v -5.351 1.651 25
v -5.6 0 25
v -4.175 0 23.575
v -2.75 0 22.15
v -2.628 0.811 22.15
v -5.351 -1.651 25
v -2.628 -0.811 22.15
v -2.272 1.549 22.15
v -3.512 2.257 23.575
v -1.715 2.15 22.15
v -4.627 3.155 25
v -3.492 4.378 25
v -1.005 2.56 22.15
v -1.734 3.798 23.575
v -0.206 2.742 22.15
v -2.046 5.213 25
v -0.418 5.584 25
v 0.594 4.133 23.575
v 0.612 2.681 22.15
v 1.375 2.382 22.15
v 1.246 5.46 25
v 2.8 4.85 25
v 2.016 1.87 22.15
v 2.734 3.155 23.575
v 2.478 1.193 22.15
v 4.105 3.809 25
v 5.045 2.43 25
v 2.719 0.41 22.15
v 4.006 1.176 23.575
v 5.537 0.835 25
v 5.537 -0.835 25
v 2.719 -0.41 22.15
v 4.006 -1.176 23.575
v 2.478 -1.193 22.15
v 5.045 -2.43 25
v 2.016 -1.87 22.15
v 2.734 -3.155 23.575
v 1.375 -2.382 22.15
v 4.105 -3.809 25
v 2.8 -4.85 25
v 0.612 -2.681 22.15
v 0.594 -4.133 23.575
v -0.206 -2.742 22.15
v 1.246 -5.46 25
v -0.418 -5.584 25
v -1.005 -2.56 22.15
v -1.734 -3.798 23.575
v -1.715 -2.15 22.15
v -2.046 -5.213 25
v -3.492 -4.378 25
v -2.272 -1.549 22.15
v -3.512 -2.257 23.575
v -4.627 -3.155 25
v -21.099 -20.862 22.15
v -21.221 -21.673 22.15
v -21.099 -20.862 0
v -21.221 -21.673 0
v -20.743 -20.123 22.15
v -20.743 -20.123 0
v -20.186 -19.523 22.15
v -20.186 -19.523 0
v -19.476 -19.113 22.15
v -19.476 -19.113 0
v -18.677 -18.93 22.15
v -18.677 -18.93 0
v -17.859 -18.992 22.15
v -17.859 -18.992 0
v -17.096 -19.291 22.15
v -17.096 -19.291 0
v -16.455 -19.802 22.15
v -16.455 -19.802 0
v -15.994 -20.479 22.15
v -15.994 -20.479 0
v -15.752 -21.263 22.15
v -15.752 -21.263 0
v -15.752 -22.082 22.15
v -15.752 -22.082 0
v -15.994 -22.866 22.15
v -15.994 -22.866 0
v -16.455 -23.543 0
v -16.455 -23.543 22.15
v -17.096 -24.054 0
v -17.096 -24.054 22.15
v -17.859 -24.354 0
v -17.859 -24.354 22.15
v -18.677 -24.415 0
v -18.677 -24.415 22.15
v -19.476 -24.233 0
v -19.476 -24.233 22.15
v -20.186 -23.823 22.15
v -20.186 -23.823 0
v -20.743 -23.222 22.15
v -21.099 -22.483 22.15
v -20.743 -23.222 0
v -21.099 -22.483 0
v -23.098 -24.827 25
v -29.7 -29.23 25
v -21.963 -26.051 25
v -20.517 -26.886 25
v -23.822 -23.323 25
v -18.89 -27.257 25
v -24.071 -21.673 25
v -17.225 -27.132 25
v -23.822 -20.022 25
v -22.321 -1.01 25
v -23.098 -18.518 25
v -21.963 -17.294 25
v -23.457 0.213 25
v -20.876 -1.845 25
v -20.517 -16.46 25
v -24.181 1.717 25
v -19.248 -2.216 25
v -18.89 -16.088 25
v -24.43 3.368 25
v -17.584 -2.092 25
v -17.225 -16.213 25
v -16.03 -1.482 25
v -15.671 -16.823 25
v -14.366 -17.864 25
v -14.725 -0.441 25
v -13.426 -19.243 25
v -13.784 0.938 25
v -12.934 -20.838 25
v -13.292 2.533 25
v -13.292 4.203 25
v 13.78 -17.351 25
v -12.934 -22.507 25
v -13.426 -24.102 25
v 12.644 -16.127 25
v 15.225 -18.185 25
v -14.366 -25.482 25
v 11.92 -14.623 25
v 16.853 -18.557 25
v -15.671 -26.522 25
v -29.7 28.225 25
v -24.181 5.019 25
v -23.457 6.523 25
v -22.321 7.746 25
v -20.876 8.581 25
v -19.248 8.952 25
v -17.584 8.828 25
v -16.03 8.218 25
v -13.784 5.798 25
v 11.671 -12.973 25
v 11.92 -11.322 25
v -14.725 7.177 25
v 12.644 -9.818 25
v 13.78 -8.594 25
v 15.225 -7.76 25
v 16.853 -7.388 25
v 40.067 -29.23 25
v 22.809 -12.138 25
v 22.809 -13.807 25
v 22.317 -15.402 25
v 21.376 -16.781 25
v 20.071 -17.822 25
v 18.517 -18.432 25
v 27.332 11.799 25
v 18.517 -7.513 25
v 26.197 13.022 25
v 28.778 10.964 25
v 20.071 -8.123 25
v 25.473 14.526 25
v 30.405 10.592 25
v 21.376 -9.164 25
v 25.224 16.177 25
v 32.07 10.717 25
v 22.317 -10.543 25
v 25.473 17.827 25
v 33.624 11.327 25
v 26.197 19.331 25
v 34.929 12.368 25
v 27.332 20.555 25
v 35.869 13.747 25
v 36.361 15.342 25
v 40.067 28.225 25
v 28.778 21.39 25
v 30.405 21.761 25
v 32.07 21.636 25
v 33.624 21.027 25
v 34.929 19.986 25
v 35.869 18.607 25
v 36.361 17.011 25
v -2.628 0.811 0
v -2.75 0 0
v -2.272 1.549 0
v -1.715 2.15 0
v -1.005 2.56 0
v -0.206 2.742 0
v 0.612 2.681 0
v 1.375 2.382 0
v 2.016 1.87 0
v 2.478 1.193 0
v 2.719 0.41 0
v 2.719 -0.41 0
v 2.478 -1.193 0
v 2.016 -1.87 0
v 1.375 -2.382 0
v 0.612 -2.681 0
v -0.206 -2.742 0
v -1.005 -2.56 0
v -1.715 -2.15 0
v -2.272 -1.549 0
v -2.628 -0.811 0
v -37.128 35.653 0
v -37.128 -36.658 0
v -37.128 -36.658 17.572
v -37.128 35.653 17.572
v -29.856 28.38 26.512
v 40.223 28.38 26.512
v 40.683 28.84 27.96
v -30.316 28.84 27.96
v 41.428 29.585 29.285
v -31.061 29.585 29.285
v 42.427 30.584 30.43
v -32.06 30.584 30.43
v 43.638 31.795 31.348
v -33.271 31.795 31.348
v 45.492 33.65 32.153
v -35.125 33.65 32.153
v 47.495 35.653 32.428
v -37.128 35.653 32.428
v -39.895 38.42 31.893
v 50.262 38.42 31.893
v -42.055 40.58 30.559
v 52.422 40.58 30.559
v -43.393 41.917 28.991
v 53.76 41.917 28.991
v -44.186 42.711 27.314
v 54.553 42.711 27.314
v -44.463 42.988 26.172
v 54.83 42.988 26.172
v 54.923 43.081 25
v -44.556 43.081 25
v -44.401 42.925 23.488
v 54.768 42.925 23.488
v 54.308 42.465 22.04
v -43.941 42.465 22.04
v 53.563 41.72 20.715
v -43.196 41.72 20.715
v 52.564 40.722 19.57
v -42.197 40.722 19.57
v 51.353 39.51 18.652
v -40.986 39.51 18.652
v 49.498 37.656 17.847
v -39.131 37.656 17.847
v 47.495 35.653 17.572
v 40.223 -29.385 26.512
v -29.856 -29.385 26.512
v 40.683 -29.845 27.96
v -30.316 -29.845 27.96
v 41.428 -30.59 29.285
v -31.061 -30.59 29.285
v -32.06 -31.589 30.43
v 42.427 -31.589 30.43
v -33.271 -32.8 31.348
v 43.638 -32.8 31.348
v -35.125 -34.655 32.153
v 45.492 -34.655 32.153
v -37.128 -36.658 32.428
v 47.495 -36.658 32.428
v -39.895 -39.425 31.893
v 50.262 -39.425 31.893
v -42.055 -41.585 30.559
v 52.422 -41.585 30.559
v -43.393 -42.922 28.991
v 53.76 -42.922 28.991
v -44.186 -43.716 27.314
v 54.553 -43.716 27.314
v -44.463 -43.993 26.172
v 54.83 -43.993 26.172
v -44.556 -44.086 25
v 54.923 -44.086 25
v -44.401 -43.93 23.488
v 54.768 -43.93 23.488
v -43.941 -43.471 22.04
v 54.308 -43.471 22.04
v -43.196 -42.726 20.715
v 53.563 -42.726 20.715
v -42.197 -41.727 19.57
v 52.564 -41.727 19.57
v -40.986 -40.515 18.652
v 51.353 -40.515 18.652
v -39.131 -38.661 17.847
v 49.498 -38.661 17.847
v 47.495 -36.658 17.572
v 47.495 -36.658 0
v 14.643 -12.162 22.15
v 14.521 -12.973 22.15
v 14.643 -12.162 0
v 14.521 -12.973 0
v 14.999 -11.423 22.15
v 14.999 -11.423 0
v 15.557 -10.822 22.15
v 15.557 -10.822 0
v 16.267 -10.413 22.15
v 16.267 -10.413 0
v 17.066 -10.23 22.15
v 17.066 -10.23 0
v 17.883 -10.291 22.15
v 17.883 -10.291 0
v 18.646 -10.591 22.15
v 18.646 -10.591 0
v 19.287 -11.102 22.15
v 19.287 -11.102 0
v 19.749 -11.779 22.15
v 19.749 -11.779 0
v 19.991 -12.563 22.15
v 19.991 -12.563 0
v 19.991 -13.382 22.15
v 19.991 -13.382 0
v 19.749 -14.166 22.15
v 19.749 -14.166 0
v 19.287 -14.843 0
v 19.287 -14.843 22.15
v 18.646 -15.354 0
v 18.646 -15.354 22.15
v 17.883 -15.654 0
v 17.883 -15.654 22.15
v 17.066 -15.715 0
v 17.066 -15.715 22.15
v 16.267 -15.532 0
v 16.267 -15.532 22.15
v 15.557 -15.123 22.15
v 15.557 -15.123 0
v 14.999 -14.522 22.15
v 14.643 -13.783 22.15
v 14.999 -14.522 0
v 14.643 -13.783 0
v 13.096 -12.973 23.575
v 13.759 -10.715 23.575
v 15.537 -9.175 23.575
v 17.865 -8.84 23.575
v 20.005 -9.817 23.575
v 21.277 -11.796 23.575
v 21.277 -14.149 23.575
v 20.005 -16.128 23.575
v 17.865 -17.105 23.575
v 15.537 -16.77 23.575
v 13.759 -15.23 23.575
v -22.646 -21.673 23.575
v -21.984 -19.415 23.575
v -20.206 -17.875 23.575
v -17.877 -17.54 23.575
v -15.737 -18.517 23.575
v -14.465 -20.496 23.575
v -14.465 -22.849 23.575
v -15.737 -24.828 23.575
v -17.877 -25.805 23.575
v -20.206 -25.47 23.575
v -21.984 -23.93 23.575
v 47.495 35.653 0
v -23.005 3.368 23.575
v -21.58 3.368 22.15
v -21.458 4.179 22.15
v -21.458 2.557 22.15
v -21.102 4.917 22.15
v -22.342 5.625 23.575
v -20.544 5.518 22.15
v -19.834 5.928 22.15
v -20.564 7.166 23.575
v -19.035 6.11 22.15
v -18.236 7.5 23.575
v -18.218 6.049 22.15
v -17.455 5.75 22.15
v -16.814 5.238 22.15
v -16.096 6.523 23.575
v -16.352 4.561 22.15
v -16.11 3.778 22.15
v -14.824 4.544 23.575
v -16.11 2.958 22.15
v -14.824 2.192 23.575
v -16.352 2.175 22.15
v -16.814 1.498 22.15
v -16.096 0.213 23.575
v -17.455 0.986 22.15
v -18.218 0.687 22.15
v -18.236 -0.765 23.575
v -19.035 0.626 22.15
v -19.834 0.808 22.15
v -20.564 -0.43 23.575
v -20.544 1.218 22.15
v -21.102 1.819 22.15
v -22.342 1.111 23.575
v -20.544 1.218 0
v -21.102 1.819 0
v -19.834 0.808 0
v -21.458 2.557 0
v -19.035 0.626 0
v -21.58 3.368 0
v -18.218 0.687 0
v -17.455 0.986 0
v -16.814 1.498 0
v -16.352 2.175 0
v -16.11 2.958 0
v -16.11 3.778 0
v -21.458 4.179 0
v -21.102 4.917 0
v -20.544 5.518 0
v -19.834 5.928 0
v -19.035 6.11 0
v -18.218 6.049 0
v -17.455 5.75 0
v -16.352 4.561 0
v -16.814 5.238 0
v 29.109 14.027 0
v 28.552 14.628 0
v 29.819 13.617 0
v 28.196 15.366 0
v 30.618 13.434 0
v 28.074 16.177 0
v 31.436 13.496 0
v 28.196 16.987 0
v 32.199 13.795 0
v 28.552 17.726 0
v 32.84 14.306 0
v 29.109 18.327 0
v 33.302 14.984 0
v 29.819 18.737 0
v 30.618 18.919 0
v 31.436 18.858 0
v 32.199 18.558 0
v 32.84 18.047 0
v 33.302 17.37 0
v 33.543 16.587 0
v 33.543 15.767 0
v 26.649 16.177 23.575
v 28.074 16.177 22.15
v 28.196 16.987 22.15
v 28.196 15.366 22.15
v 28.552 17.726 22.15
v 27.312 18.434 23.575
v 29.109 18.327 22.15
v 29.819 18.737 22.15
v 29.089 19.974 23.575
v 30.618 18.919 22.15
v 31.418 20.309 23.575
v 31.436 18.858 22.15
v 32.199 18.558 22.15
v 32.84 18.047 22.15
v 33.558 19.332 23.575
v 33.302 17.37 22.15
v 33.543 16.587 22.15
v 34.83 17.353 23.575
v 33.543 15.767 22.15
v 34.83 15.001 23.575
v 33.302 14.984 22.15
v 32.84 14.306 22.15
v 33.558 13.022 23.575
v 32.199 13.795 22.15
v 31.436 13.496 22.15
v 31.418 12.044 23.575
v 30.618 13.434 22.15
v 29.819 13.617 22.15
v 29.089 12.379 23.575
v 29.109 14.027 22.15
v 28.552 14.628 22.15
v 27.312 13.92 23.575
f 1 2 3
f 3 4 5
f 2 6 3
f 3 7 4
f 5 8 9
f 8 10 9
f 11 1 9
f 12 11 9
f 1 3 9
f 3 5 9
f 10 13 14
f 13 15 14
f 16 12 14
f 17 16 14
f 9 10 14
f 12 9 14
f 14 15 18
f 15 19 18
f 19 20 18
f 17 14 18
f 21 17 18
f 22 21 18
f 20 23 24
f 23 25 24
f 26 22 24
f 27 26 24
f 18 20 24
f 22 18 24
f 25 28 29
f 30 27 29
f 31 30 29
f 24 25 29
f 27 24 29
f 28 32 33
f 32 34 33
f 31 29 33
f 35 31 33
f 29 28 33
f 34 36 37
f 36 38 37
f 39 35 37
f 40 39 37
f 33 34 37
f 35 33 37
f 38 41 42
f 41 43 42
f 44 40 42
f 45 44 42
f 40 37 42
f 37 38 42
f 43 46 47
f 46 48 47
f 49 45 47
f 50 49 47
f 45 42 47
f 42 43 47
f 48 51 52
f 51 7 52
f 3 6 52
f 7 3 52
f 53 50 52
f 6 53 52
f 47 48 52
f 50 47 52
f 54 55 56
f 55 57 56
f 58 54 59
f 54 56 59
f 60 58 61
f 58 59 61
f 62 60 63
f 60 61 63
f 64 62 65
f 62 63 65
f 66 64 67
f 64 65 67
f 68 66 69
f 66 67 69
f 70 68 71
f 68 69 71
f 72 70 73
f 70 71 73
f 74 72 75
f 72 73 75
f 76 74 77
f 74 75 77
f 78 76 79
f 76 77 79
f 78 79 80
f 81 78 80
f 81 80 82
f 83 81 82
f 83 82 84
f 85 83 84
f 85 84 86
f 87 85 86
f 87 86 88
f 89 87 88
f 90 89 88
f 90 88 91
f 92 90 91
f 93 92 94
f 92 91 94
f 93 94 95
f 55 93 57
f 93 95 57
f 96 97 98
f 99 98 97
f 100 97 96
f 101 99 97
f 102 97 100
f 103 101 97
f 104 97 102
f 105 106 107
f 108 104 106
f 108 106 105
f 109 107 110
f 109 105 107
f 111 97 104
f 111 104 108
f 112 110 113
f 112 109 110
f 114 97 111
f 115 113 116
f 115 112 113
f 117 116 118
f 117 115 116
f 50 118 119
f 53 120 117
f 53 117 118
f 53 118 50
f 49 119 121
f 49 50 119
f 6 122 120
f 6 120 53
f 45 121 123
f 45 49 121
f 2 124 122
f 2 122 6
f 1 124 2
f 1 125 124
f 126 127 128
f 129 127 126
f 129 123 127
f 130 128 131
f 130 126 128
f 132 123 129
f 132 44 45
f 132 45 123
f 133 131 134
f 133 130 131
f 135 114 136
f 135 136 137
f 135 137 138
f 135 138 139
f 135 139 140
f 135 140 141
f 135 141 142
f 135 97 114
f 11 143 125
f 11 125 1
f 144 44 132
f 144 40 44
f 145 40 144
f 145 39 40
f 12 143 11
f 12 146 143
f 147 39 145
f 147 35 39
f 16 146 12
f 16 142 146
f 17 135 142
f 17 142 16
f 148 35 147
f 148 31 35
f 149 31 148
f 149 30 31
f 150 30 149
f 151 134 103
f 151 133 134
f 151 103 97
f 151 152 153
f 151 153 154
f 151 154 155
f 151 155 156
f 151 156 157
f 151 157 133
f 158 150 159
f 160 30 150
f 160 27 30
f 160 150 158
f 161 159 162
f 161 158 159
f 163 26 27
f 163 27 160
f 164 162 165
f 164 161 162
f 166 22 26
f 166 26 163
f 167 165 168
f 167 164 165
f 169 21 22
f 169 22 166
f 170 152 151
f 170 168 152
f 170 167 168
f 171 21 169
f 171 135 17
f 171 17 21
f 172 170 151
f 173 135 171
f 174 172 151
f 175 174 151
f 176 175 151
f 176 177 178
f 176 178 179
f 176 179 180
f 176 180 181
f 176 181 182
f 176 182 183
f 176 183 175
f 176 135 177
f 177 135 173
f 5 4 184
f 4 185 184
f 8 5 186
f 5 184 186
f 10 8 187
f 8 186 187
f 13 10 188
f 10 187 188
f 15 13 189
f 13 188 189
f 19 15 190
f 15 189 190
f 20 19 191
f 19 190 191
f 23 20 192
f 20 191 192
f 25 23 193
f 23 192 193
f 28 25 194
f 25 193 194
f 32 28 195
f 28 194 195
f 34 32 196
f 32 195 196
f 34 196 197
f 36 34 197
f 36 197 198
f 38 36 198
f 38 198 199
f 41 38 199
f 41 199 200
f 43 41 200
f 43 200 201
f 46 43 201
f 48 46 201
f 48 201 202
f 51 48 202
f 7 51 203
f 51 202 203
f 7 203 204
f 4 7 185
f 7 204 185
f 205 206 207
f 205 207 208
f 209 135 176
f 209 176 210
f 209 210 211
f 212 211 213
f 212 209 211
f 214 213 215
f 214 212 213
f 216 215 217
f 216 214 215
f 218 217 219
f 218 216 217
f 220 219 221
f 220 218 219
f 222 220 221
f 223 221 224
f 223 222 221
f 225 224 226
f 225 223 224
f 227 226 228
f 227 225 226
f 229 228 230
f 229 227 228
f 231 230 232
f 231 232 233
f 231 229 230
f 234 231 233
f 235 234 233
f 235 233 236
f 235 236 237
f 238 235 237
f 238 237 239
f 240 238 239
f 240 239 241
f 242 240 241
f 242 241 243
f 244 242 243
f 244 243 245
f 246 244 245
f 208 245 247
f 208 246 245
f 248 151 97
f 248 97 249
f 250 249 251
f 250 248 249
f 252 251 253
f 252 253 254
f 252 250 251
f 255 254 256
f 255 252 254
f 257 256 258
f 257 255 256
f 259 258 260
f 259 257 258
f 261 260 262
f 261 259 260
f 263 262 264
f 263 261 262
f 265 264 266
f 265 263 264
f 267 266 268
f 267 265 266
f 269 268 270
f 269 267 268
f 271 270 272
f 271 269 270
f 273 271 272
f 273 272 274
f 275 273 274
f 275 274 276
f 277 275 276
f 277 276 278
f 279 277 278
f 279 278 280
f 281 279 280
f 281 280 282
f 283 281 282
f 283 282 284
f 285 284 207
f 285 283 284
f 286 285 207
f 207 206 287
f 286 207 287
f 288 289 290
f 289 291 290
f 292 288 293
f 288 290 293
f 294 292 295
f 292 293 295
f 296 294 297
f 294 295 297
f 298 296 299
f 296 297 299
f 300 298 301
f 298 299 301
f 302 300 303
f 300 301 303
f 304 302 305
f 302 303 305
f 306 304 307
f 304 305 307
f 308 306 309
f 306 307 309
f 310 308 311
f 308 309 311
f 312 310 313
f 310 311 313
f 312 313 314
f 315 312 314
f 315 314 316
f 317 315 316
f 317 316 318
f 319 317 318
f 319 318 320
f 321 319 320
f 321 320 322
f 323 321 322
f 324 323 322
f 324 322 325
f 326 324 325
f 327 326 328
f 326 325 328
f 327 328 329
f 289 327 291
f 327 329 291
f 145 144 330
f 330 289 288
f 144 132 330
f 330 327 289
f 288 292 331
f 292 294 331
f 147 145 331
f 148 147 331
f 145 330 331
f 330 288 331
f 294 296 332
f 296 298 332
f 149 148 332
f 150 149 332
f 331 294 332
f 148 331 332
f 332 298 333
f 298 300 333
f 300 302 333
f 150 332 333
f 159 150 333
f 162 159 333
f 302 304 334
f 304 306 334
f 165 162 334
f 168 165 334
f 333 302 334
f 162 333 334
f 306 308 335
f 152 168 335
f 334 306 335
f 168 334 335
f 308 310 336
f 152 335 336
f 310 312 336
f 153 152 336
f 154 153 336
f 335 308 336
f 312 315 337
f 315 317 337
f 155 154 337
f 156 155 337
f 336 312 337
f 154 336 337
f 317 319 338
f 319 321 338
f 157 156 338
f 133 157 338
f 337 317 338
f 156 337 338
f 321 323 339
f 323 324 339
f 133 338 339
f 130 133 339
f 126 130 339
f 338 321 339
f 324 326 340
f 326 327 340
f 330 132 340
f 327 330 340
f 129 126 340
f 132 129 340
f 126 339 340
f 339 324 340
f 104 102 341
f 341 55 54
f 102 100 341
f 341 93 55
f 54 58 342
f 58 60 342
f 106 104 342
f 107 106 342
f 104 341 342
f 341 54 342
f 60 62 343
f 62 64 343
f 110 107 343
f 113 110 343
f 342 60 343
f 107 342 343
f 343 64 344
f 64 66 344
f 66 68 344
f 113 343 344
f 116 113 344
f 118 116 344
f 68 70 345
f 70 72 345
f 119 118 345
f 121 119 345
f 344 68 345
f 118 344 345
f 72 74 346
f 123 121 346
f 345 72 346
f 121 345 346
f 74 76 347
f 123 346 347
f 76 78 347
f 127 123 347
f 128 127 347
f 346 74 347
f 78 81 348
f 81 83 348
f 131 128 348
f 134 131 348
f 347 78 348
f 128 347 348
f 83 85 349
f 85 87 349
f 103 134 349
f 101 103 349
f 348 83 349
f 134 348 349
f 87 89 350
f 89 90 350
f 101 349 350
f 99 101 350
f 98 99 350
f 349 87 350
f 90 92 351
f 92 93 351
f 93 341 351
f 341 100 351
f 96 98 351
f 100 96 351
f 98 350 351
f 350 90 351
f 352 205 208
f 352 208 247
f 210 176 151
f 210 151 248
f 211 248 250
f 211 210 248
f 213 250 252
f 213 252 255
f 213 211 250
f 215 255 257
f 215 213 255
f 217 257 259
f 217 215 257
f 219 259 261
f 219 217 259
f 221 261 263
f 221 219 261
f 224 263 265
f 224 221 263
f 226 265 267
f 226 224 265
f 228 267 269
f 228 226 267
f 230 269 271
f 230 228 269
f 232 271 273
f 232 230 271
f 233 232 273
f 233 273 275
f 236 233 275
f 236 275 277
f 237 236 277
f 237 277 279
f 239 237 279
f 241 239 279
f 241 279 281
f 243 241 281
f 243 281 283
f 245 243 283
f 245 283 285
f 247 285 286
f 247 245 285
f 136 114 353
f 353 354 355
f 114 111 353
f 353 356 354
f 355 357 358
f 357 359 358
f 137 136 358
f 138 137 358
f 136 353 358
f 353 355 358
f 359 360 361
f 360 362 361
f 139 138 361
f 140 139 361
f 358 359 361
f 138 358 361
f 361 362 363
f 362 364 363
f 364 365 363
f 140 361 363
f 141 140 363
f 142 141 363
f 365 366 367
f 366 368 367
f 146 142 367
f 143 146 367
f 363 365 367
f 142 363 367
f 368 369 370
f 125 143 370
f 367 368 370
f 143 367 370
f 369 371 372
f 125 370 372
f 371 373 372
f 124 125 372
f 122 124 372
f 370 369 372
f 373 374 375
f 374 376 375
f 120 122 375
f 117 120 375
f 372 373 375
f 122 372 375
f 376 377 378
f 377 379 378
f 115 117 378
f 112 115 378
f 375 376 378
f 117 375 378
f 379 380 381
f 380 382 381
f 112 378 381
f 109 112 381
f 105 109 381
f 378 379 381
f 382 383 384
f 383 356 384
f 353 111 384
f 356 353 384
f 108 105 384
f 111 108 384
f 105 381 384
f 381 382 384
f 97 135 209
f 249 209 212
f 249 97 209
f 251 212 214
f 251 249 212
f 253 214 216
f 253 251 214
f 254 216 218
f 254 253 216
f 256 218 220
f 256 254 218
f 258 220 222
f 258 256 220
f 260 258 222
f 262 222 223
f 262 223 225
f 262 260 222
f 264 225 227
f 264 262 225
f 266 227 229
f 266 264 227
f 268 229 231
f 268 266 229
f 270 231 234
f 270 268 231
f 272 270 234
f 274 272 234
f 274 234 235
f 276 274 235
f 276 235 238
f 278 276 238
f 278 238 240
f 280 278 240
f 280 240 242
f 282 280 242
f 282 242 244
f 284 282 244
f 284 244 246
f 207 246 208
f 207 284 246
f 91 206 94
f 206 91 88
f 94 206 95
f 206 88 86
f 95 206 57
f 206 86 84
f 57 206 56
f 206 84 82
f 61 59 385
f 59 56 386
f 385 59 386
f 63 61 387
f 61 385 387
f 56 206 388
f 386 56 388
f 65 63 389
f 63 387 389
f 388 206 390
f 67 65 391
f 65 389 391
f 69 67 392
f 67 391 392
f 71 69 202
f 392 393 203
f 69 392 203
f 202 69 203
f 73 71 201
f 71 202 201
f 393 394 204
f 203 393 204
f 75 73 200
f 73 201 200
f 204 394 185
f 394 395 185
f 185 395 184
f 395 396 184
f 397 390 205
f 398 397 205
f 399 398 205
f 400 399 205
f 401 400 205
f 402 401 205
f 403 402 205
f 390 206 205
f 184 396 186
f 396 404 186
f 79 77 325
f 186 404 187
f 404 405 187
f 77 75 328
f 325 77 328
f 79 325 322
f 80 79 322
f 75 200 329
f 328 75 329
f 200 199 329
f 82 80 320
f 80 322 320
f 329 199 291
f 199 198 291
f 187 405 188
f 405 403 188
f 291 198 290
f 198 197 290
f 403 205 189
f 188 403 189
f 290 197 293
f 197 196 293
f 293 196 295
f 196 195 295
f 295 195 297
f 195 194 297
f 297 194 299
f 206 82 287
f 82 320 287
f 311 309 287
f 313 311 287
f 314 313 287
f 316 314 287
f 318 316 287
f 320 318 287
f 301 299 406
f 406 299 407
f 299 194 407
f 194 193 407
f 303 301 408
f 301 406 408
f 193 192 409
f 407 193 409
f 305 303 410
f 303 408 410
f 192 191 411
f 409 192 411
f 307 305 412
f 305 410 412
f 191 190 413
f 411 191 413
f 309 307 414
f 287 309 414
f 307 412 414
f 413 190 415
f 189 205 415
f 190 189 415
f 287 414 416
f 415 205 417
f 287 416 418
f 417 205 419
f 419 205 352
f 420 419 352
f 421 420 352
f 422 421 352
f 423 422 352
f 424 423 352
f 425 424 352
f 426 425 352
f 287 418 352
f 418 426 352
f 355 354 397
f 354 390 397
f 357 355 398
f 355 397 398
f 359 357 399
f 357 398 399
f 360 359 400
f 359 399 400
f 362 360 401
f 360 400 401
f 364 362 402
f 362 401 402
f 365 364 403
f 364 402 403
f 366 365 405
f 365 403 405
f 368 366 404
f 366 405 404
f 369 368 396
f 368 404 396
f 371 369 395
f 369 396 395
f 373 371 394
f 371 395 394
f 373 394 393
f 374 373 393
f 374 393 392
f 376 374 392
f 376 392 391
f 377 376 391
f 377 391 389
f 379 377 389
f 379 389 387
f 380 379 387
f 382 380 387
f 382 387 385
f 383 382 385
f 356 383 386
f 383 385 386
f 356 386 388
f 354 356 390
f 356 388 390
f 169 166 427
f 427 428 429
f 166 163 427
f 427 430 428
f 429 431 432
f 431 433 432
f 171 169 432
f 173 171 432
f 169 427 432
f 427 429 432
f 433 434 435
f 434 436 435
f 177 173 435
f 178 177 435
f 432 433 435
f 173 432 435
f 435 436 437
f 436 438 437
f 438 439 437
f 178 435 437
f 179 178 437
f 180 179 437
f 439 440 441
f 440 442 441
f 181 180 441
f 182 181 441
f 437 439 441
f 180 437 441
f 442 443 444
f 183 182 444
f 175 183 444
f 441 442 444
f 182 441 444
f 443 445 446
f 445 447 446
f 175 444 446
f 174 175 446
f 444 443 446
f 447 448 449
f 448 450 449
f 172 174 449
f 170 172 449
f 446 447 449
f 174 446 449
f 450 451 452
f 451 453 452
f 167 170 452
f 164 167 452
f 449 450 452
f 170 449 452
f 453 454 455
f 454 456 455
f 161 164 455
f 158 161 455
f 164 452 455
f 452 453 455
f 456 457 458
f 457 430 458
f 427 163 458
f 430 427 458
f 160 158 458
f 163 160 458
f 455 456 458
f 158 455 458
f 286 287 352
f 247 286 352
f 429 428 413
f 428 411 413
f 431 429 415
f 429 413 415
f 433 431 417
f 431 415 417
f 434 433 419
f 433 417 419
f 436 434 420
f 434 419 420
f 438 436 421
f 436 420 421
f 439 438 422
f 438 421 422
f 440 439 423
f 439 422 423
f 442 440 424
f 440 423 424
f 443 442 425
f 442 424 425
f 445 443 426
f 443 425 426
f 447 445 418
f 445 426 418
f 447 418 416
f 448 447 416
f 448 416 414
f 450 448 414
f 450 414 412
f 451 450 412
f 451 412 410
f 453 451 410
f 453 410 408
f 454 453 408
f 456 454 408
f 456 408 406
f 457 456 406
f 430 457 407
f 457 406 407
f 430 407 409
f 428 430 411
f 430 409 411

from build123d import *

# Parameters (mm, degrees)
F0_W           = 84.6236236393
F0_H           = 72.3108425736
F1_DEPTH       = 25
F3_D           = 5.5
F3_CSINK_D     = 11.2
F3_CSINK_ANGLE = 90


with BuildPart() as f1:
    # F0 (on Top) → F1 (new body)
    with BuildSketch(Plane.XY):
        with Locations((5.1834825426, -0.5025528371)):
            Rectangle(F0_W, F0_H)
    extrude(amount=F1_DEPTH)

    # F3 (through all)
    with Locations(Plane.XY.offset(25)):
        with Locations((-18.4712763876, -21.672623232), (17.2712653875, -12.972522527), (0, 0), (-18.829761073, 3.3679855987), (30.8238454163, 16.1767713726)):
            CounterSinkHole(F3_D / 2, F3_CSINK_D / 2, counter_sink_angle=F3_CSINK_ANGLE)

    # F5: sweep along a path in F5_path
    with BuildLine(Plane(origin=(47.4952943623, 35.6528684497, 25), x_dir=(0, -1, 0), z_dir=(0, 0, -1))) as f5_path:
        Line((0, 0), (0, 84.6236236393))
        Line((0, 84.6236236393), (72.3108425736, 84.6236236393))
        Line((72.3108425736, 84.6236236393), (72.3108425736, 0))
        Line((72.3108425736, 0), (0, 0))
    # F4 (on face) → F5 (sweep)
    with BuildSketch(Plane(origin=(-37.128329277, 0, 0), x_dir=(0, -1, 0), z_dir=(-1, 0, 0))):
        with BuildLine():
            Line((-35.6528684497, 25), (-28.2249371945, 25))
            ThreePointArc((-28.2249371945, 25), (-40.9052090104, 30.2523405608), (-35.6528684497, 17.5720687448))
            Line((-35.6528684497, 17.5720687448), (-35.6528684497, 25))
        make_face()
    sweep(path=f5_path.line, transition=Transition.RIGHT)


solid = f1.part
